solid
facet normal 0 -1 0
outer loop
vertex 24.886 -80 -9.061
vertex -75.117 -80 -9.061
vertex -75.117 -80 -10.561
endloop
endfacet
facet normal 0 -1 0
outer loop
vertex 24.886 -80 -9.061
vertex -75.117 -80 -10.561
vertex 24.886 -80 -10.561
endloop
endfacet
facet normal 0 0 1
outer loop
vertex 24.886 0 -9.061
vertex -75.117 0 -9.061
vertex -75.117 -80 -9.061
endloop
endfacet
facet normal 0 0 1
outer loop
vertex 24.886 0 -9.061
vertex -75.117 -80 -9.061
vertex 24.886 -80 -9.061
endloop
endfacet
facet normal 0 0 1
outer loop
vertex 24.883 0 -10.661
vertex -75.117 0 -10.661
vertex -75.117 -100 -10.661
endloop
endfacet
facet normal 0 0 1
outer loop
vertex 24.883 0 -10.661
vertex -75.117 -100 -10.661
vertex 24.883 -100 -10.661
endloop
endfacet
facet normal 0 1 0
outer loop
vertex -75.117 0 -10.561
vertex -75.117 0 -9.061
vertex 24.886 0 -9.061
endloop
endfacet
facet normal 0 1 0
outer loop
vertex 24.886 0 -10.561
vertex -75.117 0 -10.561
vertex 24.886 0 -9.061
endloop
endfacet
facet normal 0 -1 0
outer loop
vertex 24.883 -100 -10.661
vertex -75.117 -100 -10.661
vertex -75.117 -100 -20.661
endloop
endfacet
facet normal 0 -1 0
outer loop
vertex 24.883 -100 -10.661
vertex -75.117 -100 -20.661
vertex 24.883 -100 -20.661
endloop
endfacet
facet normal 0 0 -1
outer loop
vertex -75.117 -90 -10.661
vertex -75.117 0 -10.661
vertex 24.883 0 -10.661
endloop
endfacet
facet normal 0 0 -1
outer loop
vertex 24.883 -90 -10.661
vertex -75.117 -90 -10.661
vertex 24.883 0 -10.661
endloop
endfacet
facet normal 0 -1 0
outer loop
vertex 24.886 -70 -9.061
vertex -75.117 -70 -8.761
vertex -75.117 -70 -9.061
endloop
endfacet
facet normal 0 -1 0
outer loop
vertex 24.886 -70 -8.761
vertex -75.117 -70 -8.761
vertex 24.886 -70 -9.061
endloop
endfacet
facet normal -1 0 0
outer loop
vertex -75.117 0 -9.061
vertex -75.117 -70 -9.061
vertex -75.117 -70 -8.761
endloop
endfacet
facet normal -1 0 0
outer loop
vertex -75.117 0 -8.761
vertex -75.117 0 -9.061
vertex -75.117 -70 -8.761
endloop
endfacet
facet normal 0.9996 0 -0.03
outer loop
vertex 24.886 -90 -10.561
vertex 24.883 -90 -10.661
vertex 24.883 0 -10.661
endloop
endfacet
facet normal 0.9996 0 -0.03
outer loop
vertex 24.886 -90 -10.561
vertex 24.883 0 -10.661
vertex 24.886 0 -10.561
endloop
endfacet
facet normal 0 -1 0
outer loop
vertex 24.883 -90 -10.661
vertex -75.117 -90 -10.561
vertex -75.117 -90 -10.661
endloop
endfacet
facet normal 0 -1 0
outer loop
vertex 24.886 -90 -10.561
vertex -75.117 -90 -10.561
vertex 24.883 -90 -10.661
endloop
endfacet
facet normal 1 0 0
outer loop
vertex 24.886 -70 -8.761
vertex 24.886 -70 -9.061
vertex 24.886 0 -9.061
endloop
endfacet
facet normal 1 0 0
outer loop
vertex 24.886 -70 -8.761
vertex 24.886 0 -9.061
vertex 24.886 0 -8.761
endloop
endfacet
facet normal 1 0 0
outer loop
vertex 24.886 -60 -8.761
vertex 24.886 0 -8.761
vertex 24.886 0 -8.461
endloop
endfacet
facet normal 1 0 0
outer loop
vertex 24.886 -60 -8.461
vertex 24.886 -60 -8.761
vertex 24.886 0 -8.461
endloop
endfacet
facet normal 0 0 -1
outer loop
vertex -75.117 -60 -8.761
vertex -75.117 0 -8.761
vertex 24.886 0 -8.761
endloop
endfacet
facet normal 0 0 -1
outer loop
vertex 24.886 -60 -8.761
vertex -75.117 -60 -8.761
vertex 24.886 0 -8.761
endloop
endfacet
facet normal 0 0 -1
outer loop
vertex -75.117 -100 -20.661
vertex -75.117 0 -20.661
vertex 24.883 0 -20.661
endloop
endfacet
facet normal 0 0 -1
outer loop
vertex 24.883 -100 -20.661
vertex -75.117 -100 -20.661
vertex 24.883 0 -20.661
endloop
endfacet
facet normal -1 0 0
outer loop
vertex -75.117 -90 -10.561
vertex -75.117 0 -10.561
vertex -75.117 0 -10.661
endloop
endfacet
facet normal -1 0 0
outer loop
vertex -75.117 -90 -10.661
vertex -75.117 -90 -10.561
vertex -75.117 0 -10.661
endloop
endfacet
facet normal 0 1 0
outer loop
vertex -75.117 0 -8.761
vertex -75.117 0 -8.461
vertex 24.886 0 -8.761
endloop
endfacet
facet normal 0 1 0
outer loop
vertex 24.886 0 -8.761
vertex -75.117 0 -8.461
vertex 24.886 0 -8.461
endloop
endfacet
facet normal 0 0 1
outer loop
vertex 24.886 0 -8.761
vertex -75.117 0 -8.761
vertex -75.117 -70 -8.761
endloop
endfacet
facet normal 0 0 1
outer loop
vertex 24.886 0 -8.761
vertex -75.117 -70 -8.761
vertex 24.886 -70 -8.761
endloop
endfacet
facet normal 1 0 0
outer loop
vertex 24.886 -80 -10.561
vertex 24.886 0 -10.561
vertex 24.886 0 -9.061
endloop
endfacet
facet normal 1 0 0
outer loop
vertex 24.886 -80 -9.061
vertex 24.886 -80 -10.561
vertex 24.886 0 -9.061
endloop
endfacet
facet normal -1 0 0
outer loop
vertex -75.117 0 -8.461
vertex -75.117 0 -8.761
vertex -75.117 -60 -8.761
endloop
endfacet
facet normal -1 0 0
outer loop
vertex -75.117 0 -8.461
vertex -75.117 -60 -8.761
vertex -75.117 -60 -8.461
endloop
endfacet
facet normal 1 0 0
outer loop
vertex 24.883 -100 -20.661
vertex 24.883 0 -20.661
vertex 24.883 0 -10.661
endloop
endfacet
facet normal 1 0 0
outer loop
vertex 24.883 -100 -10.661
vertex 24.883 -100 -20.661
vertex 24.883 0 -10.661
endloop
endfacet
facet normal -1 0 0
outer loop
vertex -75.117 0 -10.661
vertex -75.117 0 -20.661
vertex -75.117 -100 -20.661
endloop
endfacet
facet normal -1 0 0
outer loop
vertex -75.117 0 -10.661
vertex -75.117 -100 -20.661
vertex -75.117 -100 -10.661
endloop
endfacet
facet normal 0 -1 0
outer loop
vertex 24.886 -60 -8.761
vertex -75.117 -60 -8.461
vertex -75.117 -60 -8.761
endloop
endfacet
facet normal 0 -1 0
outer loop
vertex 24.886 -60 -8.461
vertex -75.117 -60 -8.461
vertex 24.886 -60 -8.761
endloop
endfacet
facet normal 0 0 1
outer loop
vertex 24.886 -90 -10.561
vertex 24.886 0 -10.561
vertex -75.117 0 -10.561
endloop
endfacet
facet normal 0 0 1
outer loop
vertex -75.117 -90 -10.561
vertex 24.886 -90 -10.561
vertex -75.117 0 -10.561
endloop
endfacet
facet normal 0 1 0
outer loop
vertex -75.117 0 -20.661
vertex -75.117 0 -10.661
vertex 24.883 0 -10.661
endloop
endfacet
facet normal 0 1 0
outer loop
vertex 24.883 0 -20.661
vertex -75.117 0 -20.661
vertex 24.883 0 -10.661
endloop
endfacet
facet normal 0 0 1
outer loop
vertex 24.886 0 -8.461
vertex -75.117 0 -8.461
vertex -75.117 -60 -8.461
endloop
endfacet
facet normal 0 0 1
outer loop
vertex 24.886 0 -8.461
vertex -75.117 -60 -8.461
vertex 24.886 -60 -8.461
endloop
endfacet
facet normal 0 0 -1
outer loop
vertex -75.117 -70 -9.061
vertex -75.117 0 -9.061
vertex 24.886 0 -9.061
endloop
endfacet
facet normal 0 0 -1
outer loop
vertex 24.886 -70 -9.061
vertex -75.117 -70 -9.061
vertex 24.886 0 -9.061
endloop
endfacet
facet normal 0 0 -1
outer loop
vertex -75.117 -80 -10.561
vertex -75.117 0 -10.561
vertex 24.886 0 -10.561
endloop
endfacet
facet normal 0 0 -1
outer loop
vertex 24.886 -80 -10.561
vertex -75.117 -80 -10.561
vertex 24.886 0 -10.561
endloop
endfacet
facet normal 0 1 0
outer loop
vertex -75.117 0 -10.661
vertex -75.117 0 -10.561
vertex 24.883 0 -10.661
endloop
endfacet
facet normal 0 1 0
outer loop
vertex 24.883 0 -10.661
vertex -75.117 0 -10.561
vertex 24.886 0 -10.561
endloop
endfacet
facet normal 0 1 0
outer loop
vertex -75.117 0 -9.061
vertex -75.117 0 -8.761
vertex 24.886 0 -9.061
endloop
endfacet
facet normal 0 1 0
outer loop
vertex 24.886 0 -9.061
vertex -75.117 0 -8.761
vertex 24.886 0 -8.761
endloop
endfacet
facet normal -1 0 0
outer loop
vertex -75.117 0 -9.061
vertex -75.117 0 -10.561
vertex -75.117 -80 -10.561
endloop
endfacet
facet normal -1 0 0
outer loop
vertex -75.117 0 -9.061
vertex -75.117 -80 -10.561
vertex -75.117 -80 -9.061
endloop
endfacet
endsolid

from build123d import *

# Parameters (mm, degrees)
F0_W     = 100
F0_H     = 10
F1_DEPTH = 100
F2_DEPTH = 90
F0_W_2   = 100.003165
F0_H_2   = 1.5
F3_DEPTH = 80
F0_H_3   = 0.3
F4_DEPTH = 70
F5_DEPTH = 60


with BuildPart() as f1:
    # F0 (on Front) → F1 (new body)
    with BuildSketch(Plane.XZ):
        with Locations((-25.116783, -15.660791)):
            Rectangle(F0_W, F0_H)
    extrude(amount=F1_DEPTH)


with BuildPart() as f2:
    # F0 (on Front) → F2 (new body)
    with BuildSketch(Plane.XZ):
        Polygon((-75.116783, -10.560841), (-75.116783, -10.660791), (24.883217, -10.660791), (24.886382, -10.560841), align=None)
    extrude(amount=F2_DEPTH)


with BuildPart() as f3:
    # F0 (on Front) → F3 (new body)
    with BuildSketch(Plane.XZ):
        with Locations((-25.115201, -9.810841)):
            Rectangle(F0_W_2, F0_H_2)
    extrude(amount=F3_DEPTH)


with BuildPart() as f4:
    # F0 (on Front) → F4 (new body)
    with BuildSketch(Plane.XZ):
        with Locations((-25.115201, -8.910841)):
            Rectangle(F0_W_2, F0_H_3)
    extrude(amount=F4_DEPTH)


with BuildPart() as f5:
    # F0 (on Front) → F5 (new body)
    with BuildSketch(Plane.XZ):
        with Locations((-25.115201, -8.610841)):
            Rectangle(F0_W_2, F0_H_3)
    extrude(amount=F5_DEPTH)


solid = Compound([f1.part, f2.part, f3.part, f4.part, f5.part])
